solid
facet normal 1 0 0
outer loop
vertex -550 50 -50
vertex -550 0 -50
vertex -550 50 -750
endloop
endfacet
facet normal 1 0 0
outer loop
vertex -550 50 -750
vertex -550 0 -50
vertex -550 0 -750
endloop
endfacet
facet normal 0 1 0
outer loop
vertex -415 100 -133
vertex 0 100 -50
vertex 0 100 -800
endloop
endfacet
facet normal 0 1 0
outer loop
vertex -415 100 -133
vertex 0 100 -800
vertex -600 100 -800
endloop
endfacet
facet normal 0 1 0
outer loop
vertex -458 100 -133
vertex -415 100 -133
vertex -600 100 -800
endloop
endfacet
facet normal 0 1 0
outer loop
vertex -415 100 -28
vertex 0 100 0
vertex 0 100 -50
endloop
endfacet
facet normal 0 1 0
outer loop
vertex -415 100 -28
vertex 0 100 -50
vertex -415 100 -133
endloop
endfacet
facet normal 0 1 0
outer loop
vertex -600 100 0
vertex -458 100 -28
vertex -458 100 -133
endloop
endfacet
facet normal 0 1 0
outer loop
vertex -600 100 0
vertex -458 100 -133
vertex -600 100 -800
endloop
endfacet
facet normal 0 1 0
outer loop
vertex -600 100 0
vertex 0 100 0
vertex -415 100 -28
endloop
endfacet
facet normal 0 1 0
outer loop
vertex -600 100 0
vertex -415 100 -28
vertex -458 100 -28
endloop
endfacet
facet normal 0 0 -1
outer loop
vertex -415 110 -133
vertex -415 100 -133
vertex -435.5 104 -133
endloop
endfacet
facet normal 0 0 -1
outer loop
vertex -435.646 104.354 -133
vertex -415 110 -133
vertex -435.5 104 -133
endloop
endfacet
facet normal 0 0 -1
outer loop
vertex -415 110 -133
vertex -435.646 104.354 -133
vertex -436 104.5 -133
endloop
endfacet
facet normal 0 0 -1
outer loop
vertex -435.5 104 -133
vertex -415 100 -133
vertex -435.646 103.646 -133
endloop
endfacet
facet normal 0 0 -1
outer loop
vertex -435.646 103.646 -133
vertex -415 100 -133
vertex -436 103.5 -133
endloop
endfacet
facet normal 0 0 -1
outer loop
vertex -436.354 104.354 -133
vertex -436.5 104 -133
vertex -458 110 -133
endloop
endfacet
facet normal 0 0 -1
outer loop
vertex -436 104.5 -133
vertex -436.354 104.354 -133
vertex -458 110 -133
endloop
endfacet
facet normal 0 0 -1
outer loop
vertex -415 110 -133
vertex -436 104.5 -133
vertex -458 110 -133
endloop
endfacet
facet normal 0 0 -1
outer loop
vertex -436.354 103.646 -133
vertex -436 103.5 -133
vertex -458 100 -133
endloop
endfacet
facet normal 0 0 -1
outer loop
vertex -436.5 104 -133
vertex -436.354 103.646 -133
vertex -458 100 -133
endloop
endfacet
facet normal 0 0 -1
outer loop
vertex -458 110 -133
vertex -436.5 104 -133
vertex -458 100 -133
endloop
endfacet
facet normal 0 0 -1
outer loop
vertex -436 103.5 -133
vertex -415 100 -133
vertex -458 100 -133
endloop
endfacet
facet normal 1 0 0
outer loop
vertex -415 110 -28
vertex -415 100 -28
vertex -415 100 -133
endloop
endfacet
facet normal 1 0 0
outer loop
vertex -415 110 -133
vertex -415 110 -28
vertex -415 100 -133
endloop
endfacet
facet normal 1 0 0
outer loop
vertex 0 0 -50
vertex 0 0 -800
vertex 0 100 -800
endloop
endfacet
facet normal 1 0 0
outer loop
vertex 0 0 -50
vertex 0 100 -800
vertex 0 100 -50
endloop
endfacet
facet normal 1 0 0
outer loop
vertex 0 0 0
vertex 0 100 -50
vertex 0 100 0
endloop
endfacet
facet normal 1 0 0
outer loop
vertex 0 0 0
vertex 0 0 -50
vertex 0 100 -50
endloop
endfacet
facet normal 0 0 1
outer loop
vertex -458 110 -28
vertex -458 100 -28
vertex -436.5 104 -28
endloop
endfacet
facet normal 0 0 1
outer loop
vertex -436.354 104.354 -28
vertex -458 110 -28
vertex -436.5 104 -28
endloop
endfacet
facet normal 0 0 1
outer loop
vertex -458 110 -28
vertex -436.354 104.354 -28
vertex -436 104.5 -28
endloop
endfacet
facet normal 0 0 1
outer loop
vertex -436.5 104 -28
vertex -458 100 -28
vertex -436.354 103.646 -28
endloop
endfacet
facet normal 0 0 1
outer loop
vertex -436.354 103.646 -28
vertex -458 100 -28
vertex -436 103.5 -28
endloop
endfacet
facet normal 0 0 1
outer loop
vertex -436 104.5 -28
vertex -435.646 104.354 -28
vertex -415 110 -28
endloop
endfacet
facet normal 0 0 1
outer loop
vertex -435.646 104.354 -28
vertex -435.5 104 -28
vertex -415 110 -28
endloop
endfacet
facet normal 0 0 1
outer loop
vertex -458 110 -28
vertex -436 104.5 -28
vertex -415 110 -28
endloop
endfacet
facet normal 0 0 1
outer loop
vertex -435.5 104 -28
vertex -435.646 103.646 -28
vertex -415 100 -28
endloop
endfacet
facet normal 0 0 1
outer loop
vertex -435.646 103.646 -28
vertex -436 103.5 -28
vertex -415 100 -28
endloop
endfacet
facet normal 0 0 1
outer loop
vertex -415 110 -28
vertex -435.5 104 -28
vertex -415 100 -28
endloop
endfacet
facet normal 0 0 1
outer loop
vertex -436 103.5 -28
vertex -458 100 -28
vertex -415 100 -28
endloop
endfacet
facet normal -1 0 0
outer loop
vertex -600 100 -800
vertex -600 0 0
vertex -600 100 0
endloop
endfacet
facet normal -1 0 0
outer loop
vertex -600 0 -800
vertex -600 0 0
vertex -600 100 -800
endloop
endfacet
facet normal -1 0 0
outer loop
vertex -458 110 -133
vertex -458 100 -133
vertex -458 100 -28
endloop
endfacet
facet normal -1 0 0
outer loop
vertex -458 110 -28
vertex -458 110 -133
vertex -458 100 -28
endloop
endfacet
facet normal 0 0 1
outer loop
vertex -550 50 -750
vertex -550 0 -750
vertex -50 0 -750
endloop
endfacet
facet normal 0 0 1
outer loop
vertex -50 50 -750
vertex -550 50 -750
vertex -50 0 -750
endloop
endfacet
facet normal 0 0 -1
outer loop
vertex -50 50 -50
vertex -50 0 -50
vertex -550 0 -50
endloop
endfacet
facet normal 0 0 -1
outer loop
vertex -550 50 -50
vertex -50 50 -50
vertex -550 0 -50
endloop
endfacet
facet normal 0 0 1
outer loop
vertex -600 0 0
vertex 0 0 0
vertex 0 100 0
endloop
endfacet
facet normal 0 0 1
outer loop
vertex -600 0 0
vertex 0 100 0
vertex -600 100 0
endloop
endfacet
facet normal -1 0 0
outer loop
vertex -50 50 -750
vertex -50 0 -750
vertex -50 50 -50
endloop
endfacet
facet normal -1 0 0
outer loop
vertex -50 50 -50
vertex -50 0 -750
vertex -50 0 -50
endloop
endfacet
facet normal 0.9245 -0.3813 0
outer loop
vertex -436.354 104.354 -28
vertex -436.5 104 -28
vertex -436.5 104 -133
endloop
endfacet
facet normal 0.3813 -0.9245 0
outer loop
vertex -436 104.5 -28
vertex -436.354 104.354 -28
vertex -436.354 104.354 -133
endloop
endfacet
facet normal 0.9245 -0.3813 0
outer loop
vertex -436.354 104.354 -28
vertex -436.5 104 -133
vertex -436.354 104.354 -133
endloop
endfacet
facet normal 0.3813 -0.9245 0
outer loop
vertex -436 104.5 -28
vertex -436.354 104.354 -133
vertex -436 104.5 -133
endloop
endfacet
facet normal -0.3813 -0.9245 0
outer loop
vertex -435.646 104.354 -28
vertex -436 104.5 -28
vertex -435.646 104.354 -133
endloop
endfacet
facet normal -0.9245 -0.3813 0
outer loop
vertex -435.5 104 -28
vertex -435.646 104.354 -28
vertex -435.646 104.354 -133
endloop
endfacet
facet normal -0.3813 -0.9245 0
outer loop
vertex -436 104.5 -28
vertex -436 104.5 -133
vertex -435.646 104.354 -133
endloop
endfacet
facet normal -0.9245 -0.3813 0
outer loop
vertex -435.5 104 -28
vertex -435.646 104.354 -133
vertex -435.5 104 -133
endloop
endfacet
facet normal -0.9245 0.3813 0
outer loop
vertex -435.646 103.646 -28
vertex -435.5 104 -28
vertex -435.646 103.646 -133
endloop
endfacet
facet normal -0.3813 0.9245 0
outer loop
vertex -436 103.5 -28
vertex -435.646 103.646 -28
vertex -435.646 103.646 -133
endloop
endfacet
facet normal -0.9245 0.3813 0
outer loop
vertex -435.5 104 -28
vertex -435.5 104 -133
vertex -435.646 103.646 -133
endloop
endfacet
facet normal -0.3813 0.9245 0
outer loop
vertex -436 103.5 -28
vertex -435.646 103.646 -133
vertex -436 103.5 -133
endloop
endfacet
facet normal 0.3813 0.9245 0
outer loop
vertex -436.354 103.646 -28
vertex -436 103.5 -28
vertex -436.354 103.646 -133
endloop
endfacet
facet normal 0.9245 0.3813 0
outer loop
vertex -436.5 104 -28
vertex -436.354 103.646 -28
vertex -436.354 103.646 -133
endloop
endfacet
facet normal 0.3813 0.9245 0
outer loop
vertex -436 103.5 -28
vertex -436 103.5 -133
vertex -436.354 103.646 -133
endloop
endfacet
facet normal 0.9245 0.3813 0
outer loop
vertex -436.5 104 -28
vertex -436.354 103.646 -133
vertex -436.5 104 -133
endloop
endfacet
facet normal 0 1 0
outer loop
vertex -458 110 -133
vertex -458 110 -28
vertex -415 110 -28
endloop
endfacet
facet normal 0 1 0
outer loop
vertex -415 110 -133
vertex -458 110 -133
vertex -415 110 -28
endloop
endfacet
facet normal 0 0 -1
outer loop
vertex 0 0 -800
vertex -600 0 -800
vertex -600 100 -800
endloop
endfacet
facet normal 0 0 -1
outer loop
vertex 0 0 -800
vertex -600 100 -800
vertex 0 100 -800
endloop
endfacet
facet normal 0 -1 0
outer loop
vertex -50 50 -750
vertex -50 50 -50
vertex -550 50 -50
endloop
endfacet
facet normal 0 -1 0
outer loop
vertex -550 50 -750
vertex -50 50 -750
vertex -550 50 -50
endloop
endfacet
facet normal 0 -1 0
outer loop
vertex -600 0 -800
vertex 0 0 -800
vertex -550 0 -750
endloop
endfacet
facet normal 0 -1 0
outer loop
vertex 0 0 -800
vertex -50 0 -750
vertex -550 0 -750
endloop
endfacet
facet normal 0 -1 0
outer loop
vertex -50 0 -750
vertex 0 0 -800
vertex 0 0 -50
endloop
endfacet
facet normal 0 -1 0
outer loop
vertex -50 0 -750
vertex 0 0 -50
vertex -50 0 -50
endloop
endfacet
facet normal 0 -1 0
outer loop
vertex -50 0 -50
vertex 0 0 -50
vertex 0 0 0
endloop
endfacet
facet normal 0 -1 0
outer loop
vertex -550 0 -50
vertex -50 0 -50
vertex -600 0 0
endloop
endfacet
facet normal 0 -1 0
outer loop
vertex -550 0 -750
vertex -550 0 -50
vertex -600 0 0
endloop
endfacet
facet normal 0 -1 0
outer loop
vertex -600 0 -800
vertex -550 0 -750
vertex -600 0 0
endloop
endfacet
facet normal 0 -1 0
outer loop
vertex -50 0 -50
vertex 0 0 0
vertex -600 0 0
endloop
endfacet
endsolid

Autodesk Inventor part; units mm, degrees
ref_plane "YZ Plane" through (0, 0, 0) normal (1, 0, 0) x (0, 1, 0)
sketch "Sketch1" plane through (0, 0, 0) normal (0, 1, 0) x (-1, 0, 0)
  line L0 (0, 0) -> (600, 0)
  line L1 (600, 0) -> (600, -800)
  line L2 (600, -800) -> (0, -800)
  line L3 (0, -800) -> (0, 0)
  line L4 (0, 0) -> (0, -50)
  line L5 (0, -50) -> (50, -50)
  line L6 (50, -50) -> (550, -50)
  line L7 (550, -50) -> (550, -750)
  line L8 (550, -750) -> (50, -750)
  line L9 (50, -750) -> (50, -50)
  dimension "d0" = 600
  dimension "d1" = 800
  dimension "d2" = 50
  dimension "d3" = 50
  dimension "d4" = 50
  dimension "d5" = 50
extrude "Extrusion1" add sketch "Sketch1" along normal blind 100 contours L6 L7 L8 L9 | L0 L1 L2 L3
extrude "Extrusion2" cut sketch "Sketch1" along normal blind 50 contours L6 L7 L8 L9
sketch "Sketch2" plane through (0, 100, 0) normal (0, 1, 0) x (1, 0, 0)
  line L0 (-600, 800) -> (-600, 0) projected
  line L1 (-600, 800) -> (-600, 700)
  line L2 (-600, 700) -> (-400, 700)
  arc A0 (-337.5, 762.5) -> (-337.5, 637.5) centre (-337.5, 700) ccw
  line L3 (-337.5, 762.5) -> (-50, 762.5)
  line L4 (-50, 750) -> (-550, 750) projected
  line L5 (-50, 762.5) -> (-50, 162.5)
  line L6 (-50, 50) -> (-50, 750) projected
  line L7 (-337.5, 637.5) -> (-175, 637.5)
  line L8 (-175, 637.5) -> (-175, 162.5)
  line L9 (0, 800) -> (-600, 800) projected
  point P0 (0, 0)
  dimension "d10" = 100
  dimension "d11" = 200
  dimension "d12" = 125
  dimension "d13" = 62.5
  dimension "d14" = 600
  dimension "d15" = 125
  dimension "d16" = 100
  dimension "d17" = 287.5
  dimension "d18" = 475
  dimension "d19" = 125
ref_plane "Work Plane1" through (-600, 0, -150) normal (0, 0, 1) x (1, 0, 0)
sketch "Sketch5" plane through (0, 0, 0) normal (1, 0, 0) x (0, 0, -1)
  point P0 (0, 0)
ref_plane "Work Plane2" through (-150, 0, 0) normal (1, 0, 0) x (0, 0, -1)
sketch "Sketch10" plane through (0, 100, 0) normal (0, 1, 0) x (1, 0, 0)
  line L0 (-458, 28) -> (-415, 28)
  line L1 (-415, 28) -> (-415, 133)
  line L2 (-415, 133) -> (-458, 133)
  line L3 (-458, 133) -> (-458, 28)
  point P0 (0, 0)
extrude "Extrusion9" add sketch "Sketch10" along normal blind 10
sketch "Sketch11" plane through (-415, 100, -133) normal (0, 0, -1) x (-1, 0, 0)
  circle A0 centre (21, 4) radius 0.5
  point P0 (-415, -100)
  dimension "d46" = 1
extrude "Extrusion10" cut sketch "Sketch11" against normal through all
properties part number "base"
